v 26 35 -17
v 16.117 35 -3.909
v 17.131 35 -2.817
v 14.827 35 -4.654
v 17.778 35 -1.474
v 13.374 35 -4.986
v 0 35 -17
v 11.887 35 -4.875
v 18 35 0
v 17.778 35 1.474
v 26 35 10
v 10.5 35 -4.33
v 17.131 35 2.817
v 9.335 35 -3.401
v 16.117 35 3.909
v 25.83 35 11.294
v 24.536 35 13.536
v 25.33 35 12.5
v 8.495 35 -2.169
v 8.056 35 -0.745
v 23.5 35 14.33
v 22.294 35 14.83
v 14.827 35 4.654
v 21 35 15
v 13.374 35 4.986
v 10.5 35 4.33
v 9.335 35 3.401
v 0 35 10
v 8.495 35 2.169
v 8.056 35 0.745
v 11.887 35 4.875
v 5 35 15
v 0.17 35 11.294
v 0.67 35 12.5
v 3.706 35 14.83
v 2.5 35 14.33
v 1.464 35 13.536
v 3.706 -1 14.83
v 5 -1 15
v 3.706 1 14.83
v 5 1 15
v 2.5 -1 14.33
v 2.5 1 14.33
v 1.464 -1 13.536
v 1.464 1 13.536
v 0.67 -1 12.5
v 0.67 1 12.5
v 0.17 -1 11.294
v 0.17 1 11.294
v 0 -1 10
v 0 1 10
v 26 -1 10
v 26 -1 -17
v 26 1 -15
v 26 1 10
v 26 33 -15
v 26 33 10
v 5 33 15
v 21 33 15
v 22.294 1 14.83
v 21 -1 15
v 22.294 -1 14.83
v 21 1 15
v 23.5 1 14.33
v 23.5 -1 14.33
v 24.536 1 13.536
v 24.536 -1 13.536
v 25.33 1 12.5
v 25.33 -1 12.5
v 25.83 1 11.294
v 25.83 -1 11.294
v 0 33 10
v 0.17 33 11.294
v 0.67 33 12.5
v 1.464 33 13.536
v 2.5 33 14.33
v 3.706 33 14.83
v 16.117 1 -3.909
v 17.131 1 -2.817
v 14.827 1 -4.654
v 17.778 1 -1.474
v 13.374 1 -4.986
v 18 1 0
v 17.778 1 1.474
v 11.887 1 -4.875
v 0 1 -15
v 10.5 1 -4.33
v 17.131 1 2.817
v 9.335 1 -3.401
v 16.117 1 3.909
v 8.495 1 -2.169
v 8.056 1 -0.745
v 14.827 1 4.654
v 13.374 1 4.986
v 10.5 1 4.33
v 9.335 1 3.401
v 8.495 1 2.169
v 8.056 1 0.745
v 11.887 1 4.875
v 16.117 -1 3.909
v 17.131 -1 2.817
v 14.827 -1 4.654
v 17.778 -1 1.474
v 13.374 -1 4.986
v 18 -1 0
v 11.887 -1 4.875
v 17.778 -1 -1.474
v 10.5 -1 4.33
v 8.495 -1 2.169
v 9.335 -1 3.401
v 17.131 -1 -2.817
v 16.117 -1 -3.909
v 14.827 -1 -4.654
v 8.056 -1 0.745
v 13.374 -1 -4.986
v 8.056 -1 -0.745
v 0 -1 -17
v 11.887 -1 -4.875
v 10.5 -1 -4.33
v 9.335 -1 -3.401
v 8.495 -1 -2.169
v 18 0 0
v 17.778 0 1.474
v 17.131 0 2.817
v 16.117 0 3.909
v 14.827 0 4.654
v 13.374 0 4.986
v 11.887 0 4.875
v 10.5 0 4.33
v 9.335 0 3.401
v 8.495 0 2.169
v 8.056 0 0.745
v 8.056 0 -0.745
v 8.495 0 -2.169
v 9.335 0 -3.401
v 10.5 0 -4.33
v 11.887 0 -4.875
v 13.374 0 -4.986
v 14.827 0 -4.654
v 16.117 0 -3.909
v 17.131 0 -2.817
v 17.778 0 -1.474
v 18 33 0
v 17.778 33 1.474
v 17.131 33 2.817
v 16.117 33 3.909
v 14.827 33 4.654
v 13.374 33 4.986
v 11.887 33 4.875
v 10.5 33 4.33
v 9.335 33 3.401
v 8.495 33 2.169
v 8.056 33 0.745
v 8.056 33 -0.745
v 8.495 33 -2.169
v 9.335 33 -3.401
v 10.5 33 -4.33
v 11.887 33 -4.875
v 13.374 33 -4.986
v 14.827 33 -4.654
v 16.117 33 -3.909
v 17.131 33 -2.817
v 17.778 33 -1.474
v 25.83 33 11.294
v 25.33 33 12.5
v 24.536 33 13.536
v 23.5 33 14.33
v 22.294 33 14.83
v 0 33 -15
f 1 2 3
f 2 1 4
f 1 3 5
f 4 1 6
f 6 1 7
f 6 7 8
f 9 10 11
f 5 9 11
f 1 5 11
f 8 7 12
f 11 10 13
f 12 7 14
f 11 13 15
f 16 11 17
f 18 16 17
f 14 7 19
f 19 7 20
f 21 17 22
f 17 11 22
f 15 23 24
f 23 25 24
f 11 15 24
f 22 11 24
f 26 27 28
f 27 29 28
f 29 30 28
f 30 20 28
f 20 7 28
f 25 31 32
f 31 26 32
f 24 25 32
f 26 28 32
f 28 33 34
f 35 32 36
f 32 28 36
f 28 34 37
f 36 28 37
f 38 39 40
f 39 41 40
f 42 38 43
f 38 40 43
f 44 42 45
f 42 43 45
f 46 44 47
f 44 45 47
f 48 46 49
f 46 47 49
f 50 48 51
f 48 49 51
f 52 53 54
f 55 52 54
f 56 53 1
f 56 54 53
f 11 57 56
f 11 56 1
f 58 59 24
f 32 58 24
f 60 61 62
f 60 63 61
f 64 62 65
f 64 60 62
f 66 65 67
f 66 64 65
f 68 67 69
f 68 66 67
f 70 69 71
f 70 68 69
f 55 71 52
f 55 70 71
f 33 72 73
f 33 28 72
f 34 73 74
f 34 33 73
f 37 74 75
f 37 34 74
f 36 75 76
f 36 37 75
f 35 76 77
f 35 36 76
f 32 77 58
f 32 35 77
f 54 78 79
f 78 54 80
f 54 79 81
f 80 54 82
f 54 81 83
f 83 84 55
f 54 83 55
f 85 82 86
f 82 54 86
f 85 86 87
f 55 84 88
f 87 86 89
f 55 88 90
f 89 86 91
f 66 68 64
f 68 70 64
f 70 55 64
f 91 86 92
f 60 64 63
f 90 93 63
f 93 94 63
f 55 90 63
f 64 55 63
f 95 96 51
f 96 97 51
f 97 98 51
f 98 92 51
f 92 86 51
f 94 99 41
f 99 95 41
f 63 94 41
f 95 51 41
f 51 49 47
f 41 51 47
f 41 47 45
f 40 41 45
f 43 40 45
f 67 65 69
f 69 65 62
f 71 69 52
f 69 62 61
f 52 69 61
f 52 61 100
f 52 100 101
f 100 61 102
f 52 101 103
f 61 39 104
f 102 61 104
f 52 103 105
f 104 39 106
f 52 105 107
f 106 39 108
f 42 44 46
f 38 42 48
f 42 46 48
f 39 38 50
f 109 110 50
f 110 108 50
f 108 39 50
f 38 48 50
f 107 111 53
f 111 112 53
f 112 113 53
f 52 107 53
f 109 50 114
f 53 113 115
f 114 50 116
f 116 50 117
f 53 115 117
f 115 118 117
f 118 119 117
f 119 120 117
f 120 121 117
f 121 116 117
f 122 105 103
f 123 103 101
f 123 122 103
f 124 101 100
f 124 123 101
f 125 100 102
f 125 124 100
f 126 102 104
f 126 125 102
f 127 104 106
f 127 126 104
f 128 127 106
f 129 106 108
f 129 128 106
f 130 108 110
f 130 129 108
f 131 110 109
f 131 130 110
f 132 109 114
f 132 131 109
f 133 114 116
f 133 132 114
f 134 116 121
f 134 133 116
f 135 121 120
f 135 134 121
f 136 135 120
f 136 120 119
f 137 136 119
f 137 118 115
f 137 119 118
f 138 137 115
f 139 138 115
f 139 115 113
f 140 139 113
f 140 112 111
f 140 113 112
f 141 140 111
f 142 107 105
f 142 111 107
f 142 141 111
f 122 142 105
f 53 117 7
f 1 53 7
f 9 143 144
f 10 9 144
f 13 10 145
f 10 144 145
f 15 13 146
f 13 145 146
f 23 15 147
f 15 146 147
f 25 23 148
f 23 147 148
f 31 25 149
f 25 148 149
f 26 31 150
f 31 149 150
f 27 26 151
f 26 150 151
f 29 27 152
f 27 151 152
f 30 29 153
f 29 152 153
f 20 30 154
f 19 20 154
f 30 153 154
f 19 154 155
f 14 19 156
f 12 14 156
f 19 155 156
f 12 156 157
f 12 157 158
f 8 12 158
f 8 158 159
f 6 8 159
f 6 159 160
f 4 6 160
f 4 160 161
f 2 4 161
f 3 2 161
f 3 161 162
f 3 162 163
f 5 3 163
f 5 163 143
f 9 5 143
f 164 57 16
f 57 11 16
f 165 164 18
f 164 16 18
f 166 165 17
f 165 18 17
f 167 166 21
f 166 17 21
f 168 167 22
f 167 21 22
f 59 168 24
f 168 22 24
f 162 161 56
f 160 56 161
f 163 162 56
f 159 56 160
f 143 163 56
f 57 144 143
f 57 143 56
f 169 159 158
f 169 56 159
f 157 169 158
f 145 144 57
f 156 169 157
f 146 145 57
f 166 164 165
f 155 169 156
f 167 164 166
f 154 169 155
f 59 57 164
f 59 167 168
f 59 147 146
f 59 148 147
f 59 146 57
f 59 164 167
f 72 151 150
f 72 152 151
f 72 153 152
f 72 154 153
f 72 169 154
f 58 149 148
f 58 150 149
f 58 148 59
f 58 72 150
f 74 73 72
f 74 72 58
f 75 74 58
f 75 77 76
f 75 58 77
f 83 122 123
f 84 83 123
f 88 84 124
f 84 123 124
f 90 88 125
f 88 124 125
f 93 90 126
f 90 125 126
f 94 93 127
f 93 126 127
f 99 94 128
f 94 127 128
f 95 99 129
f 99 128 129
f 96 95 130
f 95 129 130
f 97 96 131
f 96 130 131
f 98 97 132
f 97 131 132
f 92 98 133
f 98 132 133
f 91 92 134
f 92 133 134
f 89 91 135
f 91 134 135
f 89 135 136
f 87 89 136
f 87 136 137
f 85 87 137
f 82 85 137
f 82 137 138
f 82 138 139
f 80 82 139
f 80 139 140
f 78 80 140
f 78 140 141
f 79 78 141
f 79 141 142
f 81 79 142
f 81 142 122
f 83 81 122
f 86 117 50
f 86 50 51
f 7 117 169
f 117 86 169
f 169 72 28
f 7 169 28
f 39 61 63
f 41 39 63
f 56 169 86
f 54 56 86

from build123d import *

# Parameters (mm, degrees)
F0_W     = 2
F0_H     = 30
F1_DEPTH = 26
F2_R     = 5
F3_DEPTH = 40.2
F4_R     = 5
F5_DEPTH = 23
F6_R     = 5


with BuildPart() as f1:
    # F0 (on Right) → F1 (new body)
    with BuildSketch(Plane.YZ):
        Rectangle(F0_W, F0_H)
        Polygon((1, -15), (-1, -15), (-1, -17), (35, -17), (35, -15), (33, -15), align=None)
        with Locations((34, 0)):
            Rectangle(F0_W, F0_H)
    extrude(amount=F1_DEPTH)

    # F2 (on Front) → F3 (cut)
    with BuildSketch(Plane.XZ):
        with Locations((13, 0)):
            Circle(F2_R)
    extrude(amount=-F3_DEPTH, mode=Mode.SUBTRACT)

    # F4 (on Front) → F5 (cut)
    with BuildSketch(Plane.XZ):
        with Locations((13, 0)):
            Circle(F4_R)
    extrude(amount=F5_DEPTH, mode=Mode.SUBTRACT)

    # F6
    f6_edges = [f1.edges().sort_by_distance(p)[0] for p in [
        (26, 0, 15),
        (26, 34, 15),
        (0, 0, 15),
        (0, 34, 15),
    ]]
    fillet(f6_edges, radius=F6_R)


solid = f1.part
